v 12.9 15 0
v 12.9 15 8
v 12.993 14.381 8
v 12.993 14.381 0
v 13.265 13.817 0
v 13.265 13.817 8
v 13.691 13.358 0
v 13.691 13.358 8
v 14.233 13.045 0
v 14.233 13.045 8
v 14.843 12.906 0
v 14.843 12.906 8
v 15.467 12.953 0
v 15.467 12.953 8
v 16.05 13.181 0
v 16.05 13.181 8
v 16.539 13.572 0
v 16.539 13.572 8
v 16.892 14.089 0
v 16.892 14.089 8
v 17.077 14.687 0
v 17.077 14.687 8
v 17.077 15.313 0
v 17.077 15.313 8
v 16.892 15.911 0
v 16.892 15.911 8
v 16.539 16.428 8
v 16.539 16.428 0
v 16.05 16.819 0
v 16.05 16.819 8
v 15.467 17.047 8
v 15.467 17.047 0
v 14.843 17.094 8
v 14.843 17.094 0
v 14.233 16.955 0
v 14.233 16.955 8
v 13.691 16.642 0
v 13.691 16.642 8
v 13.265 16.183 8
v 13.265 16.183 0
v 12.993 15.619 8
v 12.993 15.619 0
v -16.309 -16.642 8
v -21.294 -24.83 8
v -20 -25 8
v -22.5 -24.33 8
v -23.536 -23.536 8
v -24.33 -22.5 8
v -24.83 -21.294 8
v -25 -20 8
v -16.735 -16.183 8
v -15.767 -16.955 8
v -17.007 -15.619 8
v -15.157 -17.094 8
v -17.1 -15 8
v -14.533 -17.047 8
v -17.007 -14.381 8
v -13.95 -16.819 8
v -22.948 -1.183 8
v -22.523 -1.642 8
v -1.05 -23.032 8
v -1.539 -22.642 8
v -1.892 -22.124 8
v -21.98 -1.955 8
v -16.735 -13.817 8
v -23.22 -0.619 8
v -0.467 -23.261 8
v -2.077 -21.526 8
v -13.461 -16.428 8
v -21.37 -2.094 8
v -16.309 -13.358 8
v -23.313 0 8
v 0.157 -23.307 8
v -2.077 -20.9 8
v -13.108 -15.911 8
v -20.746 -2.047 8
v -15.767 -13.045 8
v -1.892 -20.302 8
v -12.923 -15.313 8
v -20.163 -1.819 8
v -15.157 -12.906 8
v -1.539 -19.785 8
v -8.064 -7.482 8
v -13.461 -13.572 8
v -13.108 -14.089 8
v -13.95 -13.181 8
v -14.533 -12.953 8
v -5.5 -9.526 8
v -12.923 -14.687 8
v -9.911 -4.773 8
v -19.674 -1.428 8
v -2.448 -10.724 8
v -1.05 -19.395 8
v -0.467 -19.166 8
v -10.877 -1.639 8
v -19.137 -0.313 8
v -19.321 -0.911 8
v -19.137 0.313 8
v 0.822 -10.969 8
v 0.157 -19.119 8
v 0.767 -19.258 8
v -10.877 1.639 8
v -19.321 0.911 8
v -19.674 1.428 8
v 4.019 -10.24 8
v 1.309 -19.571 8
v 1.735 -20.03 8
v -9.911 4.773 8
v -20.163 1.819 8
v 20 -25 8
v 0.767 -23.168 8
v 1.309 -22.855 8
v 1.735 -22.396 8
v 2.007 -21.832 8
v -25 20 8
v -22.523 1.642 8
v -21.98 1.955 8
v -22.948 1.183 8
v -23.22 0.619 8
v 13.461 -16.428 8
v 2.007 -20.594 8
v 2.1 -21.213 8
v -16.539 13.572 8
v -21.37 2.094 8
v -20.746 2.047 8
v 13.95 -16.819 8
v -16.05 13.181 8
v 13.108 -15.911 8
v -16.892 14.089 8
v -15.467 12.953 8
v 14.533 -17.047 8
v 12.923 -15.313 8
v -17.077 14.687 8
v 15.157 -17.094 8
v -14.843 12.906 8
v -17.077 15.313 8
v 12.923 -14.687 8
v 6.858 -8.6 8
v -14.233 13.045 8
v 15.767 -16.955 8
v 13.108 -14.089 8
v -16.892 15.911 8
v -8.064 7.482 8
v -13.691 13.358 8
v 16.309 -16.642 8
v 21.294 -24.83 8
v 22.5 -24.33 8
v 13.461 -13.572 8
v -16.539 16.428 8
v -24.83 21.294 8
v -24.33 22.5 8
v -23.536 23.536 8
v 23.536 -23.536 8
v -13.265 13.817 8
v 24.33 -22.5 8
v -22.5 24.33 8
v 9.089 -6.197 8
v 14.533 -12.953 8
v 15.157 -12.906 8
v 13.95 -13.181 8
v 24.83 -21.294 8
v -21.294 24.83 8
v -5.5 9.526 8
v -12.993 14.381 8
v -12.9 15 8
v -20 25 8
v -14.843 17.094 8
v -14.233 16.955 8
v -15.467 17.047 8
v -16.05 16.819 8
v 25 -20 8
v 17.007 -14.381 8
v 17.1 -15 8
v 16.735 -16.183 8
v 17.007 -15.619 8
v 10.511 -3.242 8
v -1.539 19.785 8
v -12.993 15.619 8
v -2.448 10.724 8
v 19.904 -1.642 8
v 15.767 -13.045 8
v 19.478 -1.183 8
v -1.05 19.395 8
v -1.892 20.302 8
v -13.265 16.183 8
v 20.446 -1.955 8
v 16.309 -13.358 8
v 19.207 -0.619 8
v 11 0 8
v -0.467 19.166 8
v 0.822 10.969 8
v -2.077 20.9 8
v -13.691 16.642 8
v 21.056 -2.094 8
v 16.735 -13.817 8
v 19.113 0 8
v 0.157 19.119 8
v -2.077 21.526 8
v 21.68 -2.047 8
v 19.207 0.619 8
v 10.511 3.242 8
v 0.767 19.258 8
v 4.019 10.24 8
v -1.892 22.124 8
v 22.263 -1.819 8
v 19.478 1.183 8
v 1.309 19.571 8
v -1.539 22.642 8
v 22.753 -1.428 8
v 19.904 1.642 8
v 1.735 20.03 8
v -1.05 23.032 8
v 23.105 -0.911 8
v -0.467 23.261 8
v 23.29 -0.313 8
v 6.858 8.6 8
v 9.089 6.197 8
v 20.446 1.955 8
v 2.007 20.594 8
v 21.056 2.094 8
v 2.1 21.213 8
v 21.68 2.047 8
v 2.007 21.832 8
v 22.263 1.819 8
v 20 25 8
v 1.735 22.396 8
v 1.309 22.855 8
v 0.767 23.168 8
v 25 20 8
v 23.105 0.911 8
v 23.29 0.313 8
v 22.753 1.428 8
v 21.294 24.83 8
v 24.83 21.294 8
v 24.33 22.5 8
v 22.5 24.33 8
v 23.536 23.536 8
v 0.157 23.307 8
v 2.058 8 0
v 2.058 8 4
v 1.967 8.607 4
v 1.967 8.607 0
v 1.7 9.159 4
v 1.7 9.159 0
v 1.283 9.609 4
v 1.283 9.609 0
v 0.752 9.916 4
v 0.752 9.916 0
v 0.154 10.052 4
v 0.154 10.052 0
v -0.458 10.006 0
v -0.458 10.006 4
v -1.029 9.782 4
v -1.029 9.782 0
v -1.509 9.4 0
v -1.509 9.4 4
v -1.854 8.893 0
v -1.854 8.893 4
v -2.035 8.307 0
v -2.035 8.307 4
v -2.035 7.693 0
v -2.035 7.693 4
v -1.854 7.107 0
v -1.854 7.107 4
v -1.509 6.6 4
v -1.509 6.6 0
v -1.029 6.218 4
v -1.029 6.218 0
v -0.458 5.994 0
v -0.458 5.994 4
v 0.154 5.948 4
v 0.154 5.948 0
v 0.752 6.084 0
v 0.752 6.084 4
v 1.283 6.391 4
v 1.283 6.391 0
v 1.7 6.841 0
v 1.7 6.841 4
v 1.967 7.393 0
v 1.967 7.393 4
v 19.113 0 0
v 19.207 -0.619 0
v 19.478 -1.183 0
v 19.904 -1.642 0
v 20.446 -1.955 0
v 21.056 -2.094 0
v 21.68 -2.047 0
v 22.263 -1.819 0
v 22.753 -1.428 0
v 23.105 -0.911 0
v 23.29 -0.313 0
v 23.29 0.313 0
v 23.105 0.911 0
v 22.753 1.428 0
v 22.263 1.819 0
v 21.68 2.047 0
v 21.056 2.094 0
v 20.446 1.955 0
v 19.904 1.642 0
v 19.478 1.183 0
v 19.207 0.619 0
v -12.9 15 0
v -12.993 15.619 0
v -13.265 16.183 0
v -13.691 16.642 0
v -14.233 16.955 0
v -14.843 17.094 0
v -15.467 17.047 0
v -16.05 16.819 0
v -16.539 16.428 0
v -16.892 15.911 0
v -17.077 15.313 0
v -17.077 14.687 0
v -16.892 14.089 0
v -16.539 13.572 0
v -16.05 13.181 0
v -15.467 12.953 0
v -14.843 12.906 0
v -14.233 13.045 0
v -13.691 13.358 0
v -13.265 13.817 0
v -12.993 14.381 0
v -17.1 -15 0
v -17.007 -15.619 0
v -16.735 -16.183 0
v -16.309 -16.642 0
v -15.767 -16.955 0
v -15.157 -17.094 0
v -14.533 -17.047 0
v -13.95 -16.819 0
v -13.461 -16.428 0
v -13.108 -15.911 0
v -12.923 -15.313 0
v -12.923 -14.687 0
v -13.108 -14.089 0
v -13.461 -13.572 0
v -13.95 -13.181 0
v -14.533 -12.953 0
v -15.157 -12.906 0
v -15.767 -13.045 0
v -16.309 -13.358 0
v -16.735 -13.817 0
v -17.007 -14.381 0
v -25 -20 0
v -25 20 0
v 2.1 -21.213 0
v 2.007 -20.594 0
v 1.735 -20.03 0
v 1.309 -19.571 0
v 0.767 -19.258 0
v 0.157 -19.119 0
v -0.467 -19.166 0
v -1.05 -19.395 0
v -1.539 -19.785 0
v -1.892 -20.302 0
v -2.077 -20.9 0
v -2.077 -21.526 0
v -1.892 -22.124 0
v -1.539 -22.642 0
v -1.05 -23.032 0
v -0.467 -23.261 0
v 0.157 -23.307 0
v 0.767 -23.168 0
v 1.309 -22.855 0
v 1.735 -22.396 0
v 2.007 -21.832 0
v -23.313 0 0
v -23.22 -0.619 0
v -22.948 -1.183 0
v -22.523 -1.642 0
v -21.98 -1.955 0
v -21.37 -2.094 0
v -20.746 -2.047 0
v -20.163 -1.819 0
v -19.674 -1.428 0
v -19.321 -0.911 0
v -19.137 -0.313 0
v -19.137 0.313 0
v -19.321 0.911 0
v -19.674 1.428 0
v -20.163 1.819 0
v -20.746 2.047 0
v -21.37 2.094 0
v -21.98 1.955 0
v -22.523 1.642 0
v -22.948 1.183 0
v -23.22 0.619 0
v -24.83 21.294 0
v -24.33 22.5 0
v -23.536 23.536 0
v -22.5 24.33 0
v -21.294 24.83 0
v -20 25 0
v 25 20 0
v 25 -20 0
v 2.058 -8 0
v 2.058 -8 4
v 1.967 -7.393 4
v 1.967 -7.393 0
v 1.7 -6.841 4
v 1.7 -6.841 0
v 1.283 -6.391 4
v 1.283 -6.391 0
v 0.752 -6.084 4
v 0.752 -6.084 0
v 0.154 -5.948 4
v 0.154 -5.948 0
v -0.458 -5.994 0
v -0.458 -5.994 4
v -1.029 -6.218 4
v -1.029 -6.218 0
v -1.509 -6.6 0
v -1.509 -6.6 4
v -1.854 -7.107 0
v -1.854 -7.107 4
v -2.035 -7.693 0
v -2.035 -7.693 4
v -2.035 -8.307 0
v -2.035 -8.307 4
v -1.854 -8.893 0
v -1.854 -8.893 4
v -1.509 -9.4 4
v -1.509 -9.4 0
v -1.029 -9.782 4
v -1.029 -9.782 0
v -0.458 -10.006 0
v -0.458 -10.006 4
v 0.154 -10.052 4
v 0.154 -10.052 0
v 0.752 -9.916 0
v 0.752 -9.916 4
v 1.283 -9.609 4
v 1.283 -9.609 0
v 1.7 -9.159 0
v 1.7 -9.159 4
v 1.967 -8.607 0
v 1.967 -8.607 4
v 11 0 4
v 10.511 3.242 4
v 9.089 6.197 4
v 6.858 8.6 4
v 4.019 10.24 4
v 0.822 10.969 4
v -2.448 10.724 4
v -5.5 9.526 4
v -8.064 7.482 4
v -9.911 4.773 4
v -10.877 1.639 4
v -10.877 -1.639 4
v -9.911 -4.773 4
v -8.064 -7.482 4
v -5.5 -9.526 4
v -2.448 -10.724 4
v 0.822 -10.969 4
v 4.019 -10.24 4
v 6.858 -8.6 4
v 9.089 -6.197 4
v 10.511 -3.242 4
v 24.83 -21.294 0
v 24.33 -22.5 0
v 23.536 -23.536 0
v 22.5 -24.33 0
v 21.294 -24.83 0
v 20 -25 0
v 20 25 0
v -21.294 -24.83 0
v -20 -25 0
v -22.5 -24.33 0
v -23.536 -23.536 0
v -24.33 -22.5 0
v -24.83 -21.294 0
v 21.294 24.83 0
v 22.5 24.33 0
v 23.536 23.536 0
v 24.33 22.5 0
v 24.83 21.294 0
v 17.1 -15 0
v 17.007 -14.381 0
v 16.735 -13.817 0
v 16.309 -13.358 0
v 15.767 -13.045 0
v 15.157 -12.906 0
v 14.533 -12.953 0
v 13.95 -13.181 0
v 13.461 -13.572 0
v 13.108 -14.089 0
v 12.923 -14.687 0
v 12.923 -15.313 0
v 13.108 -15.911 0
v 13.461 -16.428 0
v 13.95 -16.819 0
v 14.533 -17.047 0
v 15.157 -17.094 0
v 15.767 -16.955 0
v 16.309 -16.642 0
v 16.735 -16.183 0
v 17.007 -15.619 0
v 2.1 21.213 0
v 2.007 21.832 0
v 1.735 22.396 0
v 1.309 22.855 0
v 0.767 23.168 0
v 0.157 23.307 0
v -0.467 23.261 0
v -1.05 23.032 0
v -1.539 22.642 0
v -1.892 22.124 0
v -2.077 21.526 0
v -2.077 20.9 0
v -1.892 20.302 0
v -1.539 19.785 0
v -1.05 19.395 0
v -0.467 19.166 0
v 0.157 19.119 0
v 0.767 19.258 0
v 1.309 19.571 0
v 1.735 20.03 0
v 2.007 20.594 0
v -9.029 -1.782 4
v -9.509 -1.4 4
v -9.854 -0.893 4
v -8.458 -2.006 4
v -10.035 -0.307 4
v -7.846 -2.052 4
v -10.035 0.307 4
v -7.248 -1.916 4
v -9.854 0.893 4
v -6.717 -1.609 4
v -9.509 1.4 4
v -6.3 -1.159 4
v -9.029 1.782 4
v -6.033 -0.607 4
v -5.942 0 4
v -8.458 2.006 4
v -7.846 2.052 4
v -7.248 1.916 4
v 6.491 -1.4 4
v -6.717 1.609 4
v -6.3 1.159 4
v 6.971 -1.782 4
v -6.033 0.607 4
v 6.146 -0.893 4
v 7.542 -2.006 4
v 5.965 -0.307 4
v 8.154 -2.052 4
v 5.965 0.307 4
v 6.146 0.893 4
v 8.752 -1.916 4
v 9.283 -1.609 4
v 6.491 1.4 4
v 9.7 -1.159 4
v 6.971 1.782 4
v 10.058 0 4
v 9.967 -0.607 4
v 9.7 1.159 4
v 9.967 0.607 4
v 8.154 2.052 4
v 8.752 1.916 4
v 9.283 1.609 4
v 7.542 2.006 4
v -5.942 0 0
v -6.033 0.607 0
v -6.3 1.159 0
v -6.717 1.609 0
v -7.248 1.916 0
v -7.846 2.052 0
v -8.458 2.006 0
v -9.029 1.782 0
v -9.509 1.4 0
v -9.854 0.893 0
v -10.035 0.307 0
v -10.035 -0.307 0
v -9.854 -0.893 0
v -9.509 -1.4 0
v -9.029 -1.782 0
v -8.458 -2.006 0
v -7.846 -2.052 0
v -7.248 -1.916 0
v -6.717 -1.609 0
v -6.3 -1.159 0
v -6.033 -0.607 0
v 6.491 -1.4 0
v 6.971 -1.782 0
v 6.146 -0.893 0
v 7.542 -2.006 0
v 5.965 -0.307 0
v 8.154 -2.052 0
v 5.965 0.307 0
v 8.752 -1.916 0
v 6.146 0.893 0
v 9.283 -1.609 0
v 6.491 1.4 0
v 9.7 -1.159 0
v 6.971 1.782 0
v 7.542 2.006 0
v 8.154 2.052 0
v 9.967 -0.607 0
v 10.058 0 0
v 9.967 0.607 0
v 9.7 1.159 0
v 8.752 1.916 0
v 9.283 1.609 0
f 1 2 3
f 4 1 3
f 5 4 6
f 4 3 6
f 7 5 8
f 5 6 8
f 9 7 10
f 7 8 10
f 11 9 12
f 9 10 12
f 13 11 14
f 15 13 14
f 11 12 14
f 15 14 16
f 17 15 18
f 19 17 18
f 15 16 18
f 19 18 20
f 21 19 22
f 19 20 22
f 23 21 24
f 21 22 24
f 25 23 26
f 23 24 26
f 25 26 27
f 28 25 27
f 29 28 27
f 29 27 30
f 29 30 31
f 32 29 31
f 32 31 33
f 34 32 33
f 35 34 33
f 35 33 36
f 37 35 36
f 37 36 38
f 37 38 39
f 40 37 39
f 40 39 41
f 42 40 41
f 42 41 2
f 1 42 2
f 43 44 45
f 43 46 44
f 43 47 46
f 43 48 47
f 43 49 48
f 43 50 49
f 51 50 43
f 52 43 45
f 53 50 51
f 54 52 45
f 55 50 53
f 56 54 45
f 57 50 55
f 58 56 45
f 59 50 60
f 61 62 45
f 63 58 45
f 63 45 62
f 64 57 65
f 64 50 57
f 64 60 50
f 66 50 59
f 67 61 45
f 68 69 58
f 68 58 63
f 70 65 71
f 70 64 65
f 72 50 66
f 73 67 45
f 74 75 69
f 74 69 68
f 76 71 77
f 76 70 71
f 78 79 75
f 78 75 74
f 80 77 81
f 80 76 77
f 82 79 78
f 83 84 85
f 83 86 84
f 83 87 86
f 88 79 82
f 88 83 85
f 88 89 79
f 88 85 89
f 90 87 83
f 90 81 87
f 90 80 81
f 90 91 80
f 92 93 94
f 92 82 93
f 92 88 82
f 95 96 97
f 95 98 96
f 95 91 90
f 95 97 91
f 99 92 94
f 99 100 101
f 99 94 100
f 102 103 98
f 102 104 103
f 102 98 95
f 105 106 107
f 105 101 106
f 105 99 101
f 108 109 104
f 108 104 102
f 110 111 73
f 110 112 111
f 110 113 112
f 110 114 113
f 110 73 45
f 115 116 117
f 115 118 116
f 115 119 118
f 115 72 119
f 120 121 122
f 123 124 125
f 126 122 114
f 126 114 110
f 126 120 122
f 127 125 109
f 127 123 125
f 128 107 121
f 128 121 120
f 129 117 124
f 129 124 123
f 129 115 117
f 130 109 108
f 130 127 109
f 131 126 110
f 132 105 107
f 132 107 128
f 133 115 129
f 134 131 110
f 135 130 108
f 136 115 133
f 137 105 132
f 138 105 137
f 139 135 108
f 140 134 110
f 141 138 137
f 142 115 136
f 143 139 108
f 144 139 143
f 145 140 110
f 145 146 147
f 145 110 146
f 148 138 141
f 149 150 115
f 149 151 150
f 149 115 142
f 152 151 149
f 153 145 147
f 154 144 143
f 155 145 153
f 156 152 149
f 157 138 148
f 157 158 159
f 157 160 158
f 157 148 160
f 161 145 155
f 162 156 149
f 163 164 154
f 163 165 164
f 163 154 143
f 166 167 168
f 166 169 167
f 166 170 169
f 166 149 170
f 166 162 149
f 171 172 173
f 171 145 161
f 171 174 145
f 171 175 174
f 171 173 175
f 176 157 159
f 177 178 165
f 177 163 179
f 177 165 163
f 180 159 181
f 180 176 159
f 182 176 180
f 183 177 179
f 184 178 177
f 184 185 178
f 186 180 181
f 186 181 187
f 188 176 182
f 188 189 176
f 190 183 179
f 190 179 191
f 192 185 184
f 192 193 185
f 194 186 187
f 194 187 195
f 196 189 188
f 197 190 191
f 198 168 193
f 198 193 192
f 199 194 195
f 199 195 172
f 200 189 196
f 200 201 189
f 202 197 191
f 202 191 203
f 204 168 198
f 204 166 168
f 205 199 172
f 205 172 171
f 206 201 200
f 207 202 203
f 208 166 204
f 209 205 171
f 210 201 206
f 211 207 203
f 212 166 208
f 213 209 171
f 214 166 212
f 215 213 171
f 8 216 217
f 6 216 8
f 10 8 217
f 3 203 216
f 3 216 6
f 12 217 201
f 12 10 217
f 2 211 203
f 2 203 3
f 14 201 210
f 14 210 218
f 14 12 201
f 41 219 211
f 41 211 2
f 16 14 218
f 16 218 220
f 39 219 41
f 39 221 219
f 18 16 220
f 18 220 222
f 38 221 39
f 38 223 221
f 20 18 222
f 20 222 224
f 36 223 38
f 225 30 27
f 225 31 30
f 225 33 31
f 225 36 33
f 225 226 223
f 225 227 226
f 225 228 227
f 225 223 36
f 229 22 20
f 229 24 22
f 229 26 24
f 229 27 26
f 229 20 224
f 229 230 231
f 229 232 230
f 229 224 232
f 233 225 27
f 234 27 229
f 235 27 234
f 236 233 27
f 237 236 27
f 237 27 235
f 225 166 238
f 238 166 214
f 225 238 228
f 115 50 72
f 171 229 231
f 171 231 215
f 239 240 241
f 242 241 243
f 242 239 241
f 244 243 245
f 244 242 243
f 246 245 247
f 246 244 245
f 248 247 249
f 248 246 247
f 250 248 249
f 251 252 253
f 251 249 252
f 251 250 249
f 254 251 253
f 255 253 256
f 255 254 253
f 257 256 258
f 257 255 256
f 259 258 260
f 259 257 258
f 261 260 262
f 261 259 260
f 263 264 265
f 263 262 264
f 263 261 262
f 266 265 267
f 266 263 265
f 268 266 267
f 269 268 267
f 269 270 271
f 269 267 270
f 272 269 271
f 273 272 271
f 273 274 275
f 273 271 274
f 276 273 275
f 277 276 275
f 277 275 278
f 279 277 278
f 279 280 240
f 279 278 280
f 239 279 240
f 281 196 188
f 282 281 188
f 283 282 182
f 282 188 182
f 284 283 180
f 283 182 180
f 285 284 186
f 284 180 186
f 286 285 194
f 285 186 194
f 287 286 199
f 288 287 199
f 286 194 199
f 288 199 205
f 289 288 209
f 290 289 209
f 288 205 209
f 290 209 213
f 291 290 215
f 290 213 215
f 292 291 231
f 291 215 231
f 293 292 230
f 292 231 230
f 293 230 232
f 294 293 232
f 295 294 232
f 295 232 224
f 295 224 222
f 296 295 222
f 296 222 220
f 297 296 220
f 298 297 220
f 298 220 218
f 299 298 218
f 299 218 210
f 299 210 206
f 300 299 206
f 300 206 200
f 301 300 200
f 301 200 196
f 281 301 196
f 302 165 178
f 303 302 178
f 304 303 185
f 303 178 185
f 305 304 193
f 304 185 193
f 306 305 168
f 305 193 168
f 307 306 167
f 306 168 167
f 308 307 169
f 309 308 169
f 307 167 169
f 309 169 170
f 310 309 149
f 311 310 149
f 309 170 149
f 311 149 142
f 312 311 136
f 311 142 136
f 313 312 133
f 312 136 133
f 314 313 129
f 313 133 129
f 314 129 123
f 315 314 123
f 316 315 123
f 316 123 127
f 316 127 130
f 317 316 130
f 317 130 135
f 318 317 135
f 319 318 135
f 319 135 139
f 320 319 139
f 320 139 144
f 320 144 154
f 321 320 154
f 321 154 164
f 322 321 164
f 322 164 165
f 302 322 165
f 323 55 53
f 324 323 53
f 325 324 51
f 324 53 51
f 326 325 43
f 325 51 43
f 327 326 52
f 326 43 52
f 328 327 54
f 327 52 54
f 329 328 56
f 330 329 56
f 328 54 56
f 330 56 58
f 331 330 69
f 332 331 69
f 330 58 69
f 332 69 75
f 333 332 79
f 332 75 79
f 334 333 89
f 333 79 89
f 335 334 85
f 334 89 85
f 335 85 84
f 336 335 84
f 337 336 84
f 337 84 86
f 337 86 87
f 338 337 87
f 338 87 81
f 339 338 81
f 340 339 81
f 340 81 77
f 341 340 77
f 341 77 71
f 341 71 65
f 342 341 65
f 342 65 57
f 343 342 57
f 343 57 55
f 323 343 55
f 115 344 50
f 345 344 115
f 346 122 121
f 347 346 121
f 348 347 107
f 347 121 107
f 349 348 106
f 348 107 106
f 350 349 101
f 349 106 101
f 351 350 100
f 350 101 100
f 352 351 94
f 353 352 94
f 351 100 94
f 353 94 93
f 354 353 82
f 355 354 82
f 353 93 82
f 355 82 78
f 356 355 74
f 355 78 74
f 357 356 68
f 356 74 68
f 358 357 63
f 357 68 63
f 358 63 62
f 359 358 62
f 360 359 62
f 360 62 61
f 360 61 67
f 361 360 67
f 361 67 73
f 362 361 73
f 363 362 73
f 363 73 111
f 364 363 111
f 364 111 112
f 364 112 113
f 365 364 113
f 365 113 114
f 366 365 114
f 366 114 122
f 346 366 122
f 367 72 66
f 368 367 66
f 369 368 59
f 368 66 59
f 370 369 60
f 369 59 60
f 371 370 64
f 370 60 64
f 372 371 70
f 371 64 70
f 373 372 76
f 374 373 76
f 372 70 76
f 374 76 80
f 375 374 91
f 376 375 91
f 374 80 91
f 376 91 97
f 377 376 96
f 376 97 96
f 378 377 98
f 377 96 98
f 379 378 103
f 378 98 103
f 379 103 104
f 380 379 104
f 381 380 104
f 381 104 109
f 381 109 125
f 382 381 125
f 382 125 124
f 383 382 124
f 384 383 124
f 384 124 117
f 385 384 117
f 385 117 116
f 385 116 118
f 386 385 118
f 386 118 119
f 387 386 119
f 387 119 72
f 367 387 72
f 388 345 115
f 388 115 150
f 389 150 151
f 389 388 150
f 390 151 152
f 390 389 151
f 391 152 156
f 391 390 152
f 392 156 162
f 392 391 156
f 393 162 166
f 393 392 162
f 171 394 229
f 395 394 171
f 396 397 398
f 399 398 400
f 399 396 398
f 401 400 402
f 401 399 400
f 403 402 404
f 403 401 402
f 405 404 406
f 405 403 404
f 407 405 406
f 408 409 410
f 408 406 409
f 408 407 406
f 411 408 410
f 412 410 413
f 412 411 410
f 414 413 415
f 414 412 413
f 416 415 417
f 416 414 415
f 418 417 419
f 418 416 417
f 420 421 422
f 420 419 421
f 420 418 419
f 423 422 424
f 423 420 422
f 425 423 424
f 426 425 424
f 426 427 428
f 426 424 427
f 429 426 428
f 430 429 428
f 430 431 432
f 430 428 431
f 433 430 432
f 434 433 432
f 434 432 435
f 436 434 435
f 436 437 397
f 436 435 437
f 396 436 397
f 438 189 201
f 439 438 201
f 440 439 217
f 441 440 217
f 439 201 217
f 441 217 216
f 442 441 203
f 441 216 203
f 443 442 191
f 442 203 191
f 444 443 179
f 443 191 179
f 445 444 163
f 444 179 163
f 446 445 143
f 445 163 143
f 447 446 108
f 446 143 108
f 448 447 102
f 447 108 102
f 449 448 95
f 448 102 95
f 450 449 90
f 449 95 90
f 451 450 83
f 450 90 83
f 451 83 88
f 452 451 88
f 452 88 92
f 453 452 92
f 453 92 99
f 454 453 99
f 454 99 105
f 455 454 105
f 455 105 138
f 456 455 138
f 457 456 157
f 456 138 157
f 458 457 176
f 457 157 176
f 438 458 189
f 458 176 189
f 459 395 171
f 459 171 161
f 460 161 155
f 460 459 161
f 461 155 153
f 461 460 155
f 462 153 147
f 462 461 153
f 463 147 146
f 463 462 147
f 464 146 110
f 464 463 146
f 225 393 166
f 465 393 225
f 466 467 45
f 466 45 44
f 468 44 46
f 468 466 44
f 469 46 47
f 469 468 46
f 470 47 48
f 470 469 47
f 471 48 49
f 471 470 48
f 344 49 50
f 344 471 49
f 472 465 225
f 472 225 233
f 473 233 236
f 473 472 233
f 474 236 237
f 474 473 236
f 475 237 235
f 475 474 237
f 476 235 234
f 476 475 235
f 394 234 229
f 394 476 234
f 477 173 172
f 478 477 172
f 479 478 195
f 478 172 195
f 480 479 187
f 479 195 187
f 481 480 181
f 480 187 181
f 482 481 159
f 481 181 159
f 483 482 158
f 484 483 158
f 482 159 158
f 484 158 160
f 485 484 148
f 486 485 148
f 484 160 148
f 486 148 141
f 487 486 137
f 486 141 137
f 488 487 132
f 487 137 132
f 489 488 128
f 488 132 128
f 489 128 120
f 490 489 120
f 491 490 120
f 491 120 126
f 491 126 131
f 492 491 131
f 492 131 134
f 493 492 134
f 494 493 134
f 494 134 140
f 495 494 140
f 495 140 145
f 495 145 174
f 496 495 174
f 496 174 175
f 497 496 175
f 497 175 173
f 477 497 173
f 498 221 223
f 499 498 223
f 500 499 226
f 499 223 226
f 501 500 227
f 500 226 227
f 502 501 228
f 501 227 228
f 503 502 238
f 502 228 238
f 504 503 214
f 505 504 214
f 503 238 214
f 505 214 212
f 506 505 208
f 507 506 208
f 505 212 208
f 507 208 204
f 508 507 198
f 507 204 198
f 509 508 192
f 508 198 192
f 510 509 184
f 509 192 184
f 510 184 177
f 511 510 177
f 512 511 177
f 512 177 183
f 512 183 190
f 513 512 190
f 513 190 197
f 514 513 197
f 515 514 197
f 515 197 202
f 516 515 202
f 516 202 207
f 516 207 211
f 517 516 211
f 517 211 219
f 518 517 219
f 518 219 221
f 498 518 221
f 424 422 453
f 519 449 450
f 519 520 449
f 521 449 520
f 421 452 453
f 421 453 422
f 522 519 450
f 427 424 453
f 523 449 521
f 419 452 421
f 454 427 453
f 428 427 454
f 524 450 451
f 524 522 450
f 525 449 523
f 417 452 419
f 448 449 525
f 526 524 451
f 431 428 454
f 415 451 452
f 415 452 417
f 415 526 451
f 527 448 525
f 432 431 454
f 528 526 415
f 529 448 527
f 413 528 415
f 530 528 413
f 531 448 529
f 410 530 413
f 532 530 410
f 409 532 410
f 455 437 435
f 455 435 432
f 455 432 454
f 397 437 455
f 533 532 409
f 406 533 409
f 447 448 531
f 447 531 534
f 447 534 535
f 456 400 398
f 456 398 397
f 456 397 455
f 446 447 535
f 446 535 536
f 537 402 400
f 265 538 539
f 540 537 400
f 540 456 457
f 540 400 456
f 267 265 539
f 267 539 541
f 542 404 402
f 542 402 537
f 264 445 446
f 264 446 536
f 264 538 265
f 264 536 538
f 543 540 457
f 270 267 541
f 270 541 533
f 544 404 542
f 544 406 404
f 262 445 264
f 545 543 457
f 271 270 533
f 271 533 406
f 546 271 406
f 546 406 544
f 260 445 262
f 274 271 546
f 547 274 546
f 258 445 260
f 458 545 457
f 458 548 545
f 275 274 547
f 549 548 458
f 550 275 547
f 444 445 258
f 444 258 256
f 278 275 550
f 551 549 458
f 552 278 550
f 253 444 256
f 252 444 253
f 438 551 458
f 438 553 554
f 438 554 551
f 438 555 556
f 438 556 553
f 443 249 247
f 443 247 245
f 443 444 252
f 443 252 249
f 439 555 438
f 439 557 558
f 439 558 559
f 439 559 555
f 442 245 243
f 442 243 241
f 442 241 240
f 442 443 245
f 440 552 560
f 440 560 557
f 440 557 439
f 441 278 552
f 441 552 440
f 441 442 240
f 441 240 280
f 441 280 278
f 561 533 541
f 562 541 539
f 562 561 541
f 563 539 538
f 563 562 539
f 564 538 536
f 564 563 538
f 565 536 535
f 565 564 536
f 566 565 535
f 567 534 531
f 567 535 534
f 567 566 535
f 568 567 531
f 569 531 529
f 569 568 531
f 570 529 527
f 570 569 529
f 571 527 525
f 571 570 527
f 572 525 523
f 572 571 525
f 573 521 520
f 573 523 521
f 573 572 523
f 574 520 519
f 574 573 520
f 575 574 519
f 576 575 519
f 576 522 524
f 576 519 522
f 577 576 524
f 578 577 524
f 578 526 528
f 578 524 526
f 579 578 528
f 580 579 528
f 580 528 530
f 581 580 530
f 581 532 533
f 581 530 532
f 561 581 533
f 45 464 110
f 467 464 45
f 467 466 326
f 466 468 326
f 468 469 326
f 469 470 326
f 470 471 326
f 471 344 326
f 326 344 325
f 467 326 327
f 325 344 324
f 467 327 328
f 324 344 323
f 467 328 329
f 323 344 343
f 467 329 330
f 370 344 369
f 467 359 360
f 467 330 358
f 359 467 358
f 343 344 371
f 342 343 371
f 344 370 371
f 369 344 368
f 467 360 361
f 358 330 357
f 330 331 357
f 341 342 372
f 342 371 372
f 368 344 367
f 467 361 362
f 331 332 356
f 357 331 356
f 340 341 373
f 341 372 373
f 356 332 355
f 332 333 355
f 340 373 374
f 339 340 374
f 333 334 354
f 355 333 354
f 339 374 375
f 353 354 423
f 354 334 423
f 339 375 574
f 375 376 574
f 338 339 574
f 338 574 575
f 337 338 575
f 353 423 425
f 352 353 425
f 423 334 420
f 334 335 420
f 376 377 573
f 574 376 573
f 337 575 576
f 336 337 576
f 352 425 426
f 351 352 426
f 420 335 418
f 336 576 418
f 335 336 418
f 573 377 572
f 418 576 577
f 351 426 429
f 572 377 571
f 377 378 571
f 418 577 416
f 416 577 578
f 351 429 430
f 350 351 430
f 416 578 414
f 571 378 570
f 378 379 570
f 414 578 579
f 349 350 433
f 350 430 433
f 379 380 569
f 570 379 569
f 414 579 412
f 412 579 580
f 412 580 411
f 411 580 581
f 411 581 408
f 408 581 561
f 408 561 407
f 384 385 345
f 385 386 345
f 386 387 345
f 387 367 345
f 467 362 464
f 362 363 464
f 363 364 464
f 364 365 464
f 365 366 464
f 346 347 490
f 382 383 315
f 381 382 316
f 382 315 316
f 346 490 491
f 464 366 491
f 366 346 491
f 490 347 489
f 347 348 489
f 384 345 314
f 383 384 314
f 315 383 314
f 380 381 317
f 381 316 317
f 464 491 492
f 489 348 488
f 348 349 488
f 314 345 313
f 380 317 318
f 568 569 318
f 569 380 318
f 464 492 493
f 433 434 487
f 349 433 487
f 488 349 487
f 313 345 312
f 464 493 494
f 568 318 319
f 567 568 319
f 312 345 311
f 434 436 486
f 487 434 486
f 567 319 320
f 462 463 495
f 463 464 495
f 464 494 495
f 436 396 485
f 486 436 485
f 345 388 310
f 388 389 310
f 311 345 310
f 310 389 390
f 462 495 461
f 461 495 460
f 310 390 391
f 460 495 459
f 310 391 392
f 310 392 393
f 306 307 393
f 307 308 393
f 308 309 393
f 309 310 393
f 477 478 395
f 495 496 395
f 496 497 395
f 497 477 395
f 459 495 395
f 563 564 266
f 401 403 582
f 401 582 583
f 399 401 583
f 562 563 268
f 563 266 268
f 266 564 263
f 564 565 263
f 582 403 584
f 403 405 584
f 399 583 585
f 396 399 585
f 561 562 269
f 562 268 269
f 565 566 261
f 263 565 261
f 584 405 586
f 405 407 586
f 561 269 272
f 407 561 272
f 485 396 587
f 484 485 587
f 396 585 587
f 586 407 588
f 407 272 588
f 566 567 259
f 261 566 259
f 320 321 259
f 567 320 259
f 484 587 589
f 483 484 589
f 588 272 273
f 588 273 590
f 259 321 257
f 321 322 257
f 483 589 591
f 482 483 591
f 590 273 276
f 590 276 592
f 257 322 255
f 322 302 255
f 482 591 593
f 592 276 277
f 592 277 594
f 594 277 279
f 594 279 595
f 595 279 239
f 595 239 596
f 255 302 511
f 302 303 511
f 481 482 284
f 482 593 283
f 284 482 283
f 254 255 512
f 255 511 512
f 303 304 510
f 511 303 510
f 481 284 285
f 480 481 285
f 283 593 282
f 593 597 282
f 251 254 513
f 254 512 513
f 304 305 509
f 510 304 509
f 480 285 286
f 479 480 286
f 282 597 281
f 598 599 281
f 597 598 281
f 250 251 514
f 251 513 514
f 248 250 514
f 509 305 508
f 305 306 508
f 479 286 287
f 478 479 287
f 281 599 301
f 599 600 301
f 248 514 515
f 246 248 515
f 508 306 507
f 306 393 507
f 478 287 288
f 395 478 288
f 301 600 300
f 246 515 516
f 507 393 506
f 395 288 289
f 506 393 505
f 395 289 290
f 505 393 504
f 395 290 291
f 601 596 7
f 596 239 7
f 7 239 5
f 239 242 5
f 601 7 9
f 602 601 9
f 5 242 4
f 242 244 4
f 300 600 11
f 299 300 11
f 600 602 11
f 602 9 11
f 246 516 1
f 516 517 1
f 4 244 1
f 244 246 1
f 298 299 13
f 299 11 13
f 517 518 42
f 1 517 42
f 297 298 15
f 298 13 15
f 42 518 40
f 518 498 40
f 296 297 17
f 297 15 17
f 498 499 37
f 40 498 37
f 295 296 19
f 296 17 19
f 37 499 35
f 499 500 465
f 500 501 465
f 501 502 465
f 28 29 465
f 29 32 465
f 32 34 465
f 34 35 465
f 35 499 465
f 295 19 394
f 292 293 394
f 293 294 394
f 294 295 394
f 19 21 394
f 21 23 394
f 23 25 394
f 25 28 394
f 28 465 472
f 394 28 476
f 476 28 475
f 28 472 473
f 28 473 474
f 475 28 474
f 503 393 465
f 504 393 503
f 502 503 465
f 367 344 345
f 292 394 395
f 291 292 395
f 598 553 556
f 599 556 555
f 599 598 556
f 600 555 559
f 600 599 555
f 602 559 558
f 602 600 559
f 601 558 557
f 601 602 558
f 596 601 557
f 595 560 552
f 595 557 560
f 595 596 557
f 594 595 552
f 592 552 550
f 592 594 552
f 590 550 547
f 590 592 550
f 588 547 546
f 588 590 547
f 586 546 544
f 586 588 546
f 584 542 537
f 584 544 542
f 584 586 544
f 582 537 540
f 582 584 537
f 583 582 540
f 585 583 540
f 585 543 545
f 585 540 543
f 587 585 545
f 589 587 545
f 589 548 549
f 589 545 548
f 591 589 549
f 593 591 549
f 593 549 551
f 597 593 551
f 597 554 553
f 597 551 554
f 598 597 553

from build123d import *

# Parameters (mm, degrees)
SKETCH_1_R          = 14.149308539
SKETCH_1_R_2        = 2.058081242
EXTRUDE_1_DEPTH     = 8
SKETCH_2_R          = 2.1
CUT_EXTRUDE_1_DEPTH = 37.249137921
SKETCH_3_R          = 11
CUT_EXTRUDE_2_DEPTH = 4


with BuildPart() as part:
    # 草图1 → 凸台-拉伸1 (new body)
    # profile 1 of 2: a face of its own
    with BuildSketch(Plane.XY):
        with BuildLine():
            ThreePointArc((20, 25), (23.535533906, 23.535533906), (25, 20))
            Line((25, 20), (25, -20))
            ThreePointArc((25, -20), (23.535533906, -23.535533906), (20, -25))
            Line((20, -25), (-20, -25))
            ThreePointArc((-20, -25), (-23.535533906, -23.535533906), (-25, -20))
            Line((-25, -20), (-25, 20))
            ThreePointArc((-25, 20), (-23.535533906, 23.535533906), (-20, 25))
            Line((-20, 25), (20, 25))
        make_face()
        Circle(SKETCH_1_R, mode=Mode.SUBTRACT)
    # profile 2 of 2: a face of its own
    with BuildSketch(Plane.XY):
        Circle(SKETCH_1_R)
        with Locations((-8, 0)):
            Circle(SKETCH_1_R_2, mode=Mode.SUBTRACT)
        with Locations((0, -8)):
            Circle(SKETCH_1_R_2, mode=Mode.SUBTRACT)
        with Locations((8, 0)):
            Circle(SKETCH_1_R_2, mode=Mode.SUBTRACT)
        with Locations((0, 8)):
            Circle(SKETCH_1_R_2, mode=Mode.SUBTRACT)
    extrude(amount=EXTRUDE_1_DEPTH)

    # 草图2 → 切除-拉伸1 (cut, through all)
    with BuildSketch(Plane.XY.offset(8)):
        with Locations((-15, 15)):
            Circle(SKETCH_2_R)
        with Locations(Location((-15, -15, 0), (0, 0, 180))):
            Circle(SKETCH_2_R)
        with Locations((15, -15)):
            Circle(SKETCH_2_R)
        with Locations(Location((15, 15, 0), (0, 0, 180))):
            Circle(SKETCH_2_R)
        with Locations(Location((21.213203436, 0, 0), (0, 0, 180))):
            Circle(SKETCH_2_R)
        with Locations((0, 21.213203436)):
            Circle(SKETCH_2_R)
        with Locations(Location((-21.213203436, 0, 0), (0, 0, 180))):
            Circle(SKETCH_2_R)
        with Locations((0, -21.213203436)):
            Circle(SKETCH_2_R)
    extrude(amount=-CUT_EXTRUDE_1_DEPTH, mode=Mode.SUBTRACT)

    # 草图3 → 切除-拉伸2 (cut)
    with BuildSketch(Plane.XY.offset(8)):
        Circle(SKETCH_3_R)
    extrude(amount=-CUT_EXTRUDE_2_DEPTH, mode=Mode.SUBTRACT)


solid = part.part
